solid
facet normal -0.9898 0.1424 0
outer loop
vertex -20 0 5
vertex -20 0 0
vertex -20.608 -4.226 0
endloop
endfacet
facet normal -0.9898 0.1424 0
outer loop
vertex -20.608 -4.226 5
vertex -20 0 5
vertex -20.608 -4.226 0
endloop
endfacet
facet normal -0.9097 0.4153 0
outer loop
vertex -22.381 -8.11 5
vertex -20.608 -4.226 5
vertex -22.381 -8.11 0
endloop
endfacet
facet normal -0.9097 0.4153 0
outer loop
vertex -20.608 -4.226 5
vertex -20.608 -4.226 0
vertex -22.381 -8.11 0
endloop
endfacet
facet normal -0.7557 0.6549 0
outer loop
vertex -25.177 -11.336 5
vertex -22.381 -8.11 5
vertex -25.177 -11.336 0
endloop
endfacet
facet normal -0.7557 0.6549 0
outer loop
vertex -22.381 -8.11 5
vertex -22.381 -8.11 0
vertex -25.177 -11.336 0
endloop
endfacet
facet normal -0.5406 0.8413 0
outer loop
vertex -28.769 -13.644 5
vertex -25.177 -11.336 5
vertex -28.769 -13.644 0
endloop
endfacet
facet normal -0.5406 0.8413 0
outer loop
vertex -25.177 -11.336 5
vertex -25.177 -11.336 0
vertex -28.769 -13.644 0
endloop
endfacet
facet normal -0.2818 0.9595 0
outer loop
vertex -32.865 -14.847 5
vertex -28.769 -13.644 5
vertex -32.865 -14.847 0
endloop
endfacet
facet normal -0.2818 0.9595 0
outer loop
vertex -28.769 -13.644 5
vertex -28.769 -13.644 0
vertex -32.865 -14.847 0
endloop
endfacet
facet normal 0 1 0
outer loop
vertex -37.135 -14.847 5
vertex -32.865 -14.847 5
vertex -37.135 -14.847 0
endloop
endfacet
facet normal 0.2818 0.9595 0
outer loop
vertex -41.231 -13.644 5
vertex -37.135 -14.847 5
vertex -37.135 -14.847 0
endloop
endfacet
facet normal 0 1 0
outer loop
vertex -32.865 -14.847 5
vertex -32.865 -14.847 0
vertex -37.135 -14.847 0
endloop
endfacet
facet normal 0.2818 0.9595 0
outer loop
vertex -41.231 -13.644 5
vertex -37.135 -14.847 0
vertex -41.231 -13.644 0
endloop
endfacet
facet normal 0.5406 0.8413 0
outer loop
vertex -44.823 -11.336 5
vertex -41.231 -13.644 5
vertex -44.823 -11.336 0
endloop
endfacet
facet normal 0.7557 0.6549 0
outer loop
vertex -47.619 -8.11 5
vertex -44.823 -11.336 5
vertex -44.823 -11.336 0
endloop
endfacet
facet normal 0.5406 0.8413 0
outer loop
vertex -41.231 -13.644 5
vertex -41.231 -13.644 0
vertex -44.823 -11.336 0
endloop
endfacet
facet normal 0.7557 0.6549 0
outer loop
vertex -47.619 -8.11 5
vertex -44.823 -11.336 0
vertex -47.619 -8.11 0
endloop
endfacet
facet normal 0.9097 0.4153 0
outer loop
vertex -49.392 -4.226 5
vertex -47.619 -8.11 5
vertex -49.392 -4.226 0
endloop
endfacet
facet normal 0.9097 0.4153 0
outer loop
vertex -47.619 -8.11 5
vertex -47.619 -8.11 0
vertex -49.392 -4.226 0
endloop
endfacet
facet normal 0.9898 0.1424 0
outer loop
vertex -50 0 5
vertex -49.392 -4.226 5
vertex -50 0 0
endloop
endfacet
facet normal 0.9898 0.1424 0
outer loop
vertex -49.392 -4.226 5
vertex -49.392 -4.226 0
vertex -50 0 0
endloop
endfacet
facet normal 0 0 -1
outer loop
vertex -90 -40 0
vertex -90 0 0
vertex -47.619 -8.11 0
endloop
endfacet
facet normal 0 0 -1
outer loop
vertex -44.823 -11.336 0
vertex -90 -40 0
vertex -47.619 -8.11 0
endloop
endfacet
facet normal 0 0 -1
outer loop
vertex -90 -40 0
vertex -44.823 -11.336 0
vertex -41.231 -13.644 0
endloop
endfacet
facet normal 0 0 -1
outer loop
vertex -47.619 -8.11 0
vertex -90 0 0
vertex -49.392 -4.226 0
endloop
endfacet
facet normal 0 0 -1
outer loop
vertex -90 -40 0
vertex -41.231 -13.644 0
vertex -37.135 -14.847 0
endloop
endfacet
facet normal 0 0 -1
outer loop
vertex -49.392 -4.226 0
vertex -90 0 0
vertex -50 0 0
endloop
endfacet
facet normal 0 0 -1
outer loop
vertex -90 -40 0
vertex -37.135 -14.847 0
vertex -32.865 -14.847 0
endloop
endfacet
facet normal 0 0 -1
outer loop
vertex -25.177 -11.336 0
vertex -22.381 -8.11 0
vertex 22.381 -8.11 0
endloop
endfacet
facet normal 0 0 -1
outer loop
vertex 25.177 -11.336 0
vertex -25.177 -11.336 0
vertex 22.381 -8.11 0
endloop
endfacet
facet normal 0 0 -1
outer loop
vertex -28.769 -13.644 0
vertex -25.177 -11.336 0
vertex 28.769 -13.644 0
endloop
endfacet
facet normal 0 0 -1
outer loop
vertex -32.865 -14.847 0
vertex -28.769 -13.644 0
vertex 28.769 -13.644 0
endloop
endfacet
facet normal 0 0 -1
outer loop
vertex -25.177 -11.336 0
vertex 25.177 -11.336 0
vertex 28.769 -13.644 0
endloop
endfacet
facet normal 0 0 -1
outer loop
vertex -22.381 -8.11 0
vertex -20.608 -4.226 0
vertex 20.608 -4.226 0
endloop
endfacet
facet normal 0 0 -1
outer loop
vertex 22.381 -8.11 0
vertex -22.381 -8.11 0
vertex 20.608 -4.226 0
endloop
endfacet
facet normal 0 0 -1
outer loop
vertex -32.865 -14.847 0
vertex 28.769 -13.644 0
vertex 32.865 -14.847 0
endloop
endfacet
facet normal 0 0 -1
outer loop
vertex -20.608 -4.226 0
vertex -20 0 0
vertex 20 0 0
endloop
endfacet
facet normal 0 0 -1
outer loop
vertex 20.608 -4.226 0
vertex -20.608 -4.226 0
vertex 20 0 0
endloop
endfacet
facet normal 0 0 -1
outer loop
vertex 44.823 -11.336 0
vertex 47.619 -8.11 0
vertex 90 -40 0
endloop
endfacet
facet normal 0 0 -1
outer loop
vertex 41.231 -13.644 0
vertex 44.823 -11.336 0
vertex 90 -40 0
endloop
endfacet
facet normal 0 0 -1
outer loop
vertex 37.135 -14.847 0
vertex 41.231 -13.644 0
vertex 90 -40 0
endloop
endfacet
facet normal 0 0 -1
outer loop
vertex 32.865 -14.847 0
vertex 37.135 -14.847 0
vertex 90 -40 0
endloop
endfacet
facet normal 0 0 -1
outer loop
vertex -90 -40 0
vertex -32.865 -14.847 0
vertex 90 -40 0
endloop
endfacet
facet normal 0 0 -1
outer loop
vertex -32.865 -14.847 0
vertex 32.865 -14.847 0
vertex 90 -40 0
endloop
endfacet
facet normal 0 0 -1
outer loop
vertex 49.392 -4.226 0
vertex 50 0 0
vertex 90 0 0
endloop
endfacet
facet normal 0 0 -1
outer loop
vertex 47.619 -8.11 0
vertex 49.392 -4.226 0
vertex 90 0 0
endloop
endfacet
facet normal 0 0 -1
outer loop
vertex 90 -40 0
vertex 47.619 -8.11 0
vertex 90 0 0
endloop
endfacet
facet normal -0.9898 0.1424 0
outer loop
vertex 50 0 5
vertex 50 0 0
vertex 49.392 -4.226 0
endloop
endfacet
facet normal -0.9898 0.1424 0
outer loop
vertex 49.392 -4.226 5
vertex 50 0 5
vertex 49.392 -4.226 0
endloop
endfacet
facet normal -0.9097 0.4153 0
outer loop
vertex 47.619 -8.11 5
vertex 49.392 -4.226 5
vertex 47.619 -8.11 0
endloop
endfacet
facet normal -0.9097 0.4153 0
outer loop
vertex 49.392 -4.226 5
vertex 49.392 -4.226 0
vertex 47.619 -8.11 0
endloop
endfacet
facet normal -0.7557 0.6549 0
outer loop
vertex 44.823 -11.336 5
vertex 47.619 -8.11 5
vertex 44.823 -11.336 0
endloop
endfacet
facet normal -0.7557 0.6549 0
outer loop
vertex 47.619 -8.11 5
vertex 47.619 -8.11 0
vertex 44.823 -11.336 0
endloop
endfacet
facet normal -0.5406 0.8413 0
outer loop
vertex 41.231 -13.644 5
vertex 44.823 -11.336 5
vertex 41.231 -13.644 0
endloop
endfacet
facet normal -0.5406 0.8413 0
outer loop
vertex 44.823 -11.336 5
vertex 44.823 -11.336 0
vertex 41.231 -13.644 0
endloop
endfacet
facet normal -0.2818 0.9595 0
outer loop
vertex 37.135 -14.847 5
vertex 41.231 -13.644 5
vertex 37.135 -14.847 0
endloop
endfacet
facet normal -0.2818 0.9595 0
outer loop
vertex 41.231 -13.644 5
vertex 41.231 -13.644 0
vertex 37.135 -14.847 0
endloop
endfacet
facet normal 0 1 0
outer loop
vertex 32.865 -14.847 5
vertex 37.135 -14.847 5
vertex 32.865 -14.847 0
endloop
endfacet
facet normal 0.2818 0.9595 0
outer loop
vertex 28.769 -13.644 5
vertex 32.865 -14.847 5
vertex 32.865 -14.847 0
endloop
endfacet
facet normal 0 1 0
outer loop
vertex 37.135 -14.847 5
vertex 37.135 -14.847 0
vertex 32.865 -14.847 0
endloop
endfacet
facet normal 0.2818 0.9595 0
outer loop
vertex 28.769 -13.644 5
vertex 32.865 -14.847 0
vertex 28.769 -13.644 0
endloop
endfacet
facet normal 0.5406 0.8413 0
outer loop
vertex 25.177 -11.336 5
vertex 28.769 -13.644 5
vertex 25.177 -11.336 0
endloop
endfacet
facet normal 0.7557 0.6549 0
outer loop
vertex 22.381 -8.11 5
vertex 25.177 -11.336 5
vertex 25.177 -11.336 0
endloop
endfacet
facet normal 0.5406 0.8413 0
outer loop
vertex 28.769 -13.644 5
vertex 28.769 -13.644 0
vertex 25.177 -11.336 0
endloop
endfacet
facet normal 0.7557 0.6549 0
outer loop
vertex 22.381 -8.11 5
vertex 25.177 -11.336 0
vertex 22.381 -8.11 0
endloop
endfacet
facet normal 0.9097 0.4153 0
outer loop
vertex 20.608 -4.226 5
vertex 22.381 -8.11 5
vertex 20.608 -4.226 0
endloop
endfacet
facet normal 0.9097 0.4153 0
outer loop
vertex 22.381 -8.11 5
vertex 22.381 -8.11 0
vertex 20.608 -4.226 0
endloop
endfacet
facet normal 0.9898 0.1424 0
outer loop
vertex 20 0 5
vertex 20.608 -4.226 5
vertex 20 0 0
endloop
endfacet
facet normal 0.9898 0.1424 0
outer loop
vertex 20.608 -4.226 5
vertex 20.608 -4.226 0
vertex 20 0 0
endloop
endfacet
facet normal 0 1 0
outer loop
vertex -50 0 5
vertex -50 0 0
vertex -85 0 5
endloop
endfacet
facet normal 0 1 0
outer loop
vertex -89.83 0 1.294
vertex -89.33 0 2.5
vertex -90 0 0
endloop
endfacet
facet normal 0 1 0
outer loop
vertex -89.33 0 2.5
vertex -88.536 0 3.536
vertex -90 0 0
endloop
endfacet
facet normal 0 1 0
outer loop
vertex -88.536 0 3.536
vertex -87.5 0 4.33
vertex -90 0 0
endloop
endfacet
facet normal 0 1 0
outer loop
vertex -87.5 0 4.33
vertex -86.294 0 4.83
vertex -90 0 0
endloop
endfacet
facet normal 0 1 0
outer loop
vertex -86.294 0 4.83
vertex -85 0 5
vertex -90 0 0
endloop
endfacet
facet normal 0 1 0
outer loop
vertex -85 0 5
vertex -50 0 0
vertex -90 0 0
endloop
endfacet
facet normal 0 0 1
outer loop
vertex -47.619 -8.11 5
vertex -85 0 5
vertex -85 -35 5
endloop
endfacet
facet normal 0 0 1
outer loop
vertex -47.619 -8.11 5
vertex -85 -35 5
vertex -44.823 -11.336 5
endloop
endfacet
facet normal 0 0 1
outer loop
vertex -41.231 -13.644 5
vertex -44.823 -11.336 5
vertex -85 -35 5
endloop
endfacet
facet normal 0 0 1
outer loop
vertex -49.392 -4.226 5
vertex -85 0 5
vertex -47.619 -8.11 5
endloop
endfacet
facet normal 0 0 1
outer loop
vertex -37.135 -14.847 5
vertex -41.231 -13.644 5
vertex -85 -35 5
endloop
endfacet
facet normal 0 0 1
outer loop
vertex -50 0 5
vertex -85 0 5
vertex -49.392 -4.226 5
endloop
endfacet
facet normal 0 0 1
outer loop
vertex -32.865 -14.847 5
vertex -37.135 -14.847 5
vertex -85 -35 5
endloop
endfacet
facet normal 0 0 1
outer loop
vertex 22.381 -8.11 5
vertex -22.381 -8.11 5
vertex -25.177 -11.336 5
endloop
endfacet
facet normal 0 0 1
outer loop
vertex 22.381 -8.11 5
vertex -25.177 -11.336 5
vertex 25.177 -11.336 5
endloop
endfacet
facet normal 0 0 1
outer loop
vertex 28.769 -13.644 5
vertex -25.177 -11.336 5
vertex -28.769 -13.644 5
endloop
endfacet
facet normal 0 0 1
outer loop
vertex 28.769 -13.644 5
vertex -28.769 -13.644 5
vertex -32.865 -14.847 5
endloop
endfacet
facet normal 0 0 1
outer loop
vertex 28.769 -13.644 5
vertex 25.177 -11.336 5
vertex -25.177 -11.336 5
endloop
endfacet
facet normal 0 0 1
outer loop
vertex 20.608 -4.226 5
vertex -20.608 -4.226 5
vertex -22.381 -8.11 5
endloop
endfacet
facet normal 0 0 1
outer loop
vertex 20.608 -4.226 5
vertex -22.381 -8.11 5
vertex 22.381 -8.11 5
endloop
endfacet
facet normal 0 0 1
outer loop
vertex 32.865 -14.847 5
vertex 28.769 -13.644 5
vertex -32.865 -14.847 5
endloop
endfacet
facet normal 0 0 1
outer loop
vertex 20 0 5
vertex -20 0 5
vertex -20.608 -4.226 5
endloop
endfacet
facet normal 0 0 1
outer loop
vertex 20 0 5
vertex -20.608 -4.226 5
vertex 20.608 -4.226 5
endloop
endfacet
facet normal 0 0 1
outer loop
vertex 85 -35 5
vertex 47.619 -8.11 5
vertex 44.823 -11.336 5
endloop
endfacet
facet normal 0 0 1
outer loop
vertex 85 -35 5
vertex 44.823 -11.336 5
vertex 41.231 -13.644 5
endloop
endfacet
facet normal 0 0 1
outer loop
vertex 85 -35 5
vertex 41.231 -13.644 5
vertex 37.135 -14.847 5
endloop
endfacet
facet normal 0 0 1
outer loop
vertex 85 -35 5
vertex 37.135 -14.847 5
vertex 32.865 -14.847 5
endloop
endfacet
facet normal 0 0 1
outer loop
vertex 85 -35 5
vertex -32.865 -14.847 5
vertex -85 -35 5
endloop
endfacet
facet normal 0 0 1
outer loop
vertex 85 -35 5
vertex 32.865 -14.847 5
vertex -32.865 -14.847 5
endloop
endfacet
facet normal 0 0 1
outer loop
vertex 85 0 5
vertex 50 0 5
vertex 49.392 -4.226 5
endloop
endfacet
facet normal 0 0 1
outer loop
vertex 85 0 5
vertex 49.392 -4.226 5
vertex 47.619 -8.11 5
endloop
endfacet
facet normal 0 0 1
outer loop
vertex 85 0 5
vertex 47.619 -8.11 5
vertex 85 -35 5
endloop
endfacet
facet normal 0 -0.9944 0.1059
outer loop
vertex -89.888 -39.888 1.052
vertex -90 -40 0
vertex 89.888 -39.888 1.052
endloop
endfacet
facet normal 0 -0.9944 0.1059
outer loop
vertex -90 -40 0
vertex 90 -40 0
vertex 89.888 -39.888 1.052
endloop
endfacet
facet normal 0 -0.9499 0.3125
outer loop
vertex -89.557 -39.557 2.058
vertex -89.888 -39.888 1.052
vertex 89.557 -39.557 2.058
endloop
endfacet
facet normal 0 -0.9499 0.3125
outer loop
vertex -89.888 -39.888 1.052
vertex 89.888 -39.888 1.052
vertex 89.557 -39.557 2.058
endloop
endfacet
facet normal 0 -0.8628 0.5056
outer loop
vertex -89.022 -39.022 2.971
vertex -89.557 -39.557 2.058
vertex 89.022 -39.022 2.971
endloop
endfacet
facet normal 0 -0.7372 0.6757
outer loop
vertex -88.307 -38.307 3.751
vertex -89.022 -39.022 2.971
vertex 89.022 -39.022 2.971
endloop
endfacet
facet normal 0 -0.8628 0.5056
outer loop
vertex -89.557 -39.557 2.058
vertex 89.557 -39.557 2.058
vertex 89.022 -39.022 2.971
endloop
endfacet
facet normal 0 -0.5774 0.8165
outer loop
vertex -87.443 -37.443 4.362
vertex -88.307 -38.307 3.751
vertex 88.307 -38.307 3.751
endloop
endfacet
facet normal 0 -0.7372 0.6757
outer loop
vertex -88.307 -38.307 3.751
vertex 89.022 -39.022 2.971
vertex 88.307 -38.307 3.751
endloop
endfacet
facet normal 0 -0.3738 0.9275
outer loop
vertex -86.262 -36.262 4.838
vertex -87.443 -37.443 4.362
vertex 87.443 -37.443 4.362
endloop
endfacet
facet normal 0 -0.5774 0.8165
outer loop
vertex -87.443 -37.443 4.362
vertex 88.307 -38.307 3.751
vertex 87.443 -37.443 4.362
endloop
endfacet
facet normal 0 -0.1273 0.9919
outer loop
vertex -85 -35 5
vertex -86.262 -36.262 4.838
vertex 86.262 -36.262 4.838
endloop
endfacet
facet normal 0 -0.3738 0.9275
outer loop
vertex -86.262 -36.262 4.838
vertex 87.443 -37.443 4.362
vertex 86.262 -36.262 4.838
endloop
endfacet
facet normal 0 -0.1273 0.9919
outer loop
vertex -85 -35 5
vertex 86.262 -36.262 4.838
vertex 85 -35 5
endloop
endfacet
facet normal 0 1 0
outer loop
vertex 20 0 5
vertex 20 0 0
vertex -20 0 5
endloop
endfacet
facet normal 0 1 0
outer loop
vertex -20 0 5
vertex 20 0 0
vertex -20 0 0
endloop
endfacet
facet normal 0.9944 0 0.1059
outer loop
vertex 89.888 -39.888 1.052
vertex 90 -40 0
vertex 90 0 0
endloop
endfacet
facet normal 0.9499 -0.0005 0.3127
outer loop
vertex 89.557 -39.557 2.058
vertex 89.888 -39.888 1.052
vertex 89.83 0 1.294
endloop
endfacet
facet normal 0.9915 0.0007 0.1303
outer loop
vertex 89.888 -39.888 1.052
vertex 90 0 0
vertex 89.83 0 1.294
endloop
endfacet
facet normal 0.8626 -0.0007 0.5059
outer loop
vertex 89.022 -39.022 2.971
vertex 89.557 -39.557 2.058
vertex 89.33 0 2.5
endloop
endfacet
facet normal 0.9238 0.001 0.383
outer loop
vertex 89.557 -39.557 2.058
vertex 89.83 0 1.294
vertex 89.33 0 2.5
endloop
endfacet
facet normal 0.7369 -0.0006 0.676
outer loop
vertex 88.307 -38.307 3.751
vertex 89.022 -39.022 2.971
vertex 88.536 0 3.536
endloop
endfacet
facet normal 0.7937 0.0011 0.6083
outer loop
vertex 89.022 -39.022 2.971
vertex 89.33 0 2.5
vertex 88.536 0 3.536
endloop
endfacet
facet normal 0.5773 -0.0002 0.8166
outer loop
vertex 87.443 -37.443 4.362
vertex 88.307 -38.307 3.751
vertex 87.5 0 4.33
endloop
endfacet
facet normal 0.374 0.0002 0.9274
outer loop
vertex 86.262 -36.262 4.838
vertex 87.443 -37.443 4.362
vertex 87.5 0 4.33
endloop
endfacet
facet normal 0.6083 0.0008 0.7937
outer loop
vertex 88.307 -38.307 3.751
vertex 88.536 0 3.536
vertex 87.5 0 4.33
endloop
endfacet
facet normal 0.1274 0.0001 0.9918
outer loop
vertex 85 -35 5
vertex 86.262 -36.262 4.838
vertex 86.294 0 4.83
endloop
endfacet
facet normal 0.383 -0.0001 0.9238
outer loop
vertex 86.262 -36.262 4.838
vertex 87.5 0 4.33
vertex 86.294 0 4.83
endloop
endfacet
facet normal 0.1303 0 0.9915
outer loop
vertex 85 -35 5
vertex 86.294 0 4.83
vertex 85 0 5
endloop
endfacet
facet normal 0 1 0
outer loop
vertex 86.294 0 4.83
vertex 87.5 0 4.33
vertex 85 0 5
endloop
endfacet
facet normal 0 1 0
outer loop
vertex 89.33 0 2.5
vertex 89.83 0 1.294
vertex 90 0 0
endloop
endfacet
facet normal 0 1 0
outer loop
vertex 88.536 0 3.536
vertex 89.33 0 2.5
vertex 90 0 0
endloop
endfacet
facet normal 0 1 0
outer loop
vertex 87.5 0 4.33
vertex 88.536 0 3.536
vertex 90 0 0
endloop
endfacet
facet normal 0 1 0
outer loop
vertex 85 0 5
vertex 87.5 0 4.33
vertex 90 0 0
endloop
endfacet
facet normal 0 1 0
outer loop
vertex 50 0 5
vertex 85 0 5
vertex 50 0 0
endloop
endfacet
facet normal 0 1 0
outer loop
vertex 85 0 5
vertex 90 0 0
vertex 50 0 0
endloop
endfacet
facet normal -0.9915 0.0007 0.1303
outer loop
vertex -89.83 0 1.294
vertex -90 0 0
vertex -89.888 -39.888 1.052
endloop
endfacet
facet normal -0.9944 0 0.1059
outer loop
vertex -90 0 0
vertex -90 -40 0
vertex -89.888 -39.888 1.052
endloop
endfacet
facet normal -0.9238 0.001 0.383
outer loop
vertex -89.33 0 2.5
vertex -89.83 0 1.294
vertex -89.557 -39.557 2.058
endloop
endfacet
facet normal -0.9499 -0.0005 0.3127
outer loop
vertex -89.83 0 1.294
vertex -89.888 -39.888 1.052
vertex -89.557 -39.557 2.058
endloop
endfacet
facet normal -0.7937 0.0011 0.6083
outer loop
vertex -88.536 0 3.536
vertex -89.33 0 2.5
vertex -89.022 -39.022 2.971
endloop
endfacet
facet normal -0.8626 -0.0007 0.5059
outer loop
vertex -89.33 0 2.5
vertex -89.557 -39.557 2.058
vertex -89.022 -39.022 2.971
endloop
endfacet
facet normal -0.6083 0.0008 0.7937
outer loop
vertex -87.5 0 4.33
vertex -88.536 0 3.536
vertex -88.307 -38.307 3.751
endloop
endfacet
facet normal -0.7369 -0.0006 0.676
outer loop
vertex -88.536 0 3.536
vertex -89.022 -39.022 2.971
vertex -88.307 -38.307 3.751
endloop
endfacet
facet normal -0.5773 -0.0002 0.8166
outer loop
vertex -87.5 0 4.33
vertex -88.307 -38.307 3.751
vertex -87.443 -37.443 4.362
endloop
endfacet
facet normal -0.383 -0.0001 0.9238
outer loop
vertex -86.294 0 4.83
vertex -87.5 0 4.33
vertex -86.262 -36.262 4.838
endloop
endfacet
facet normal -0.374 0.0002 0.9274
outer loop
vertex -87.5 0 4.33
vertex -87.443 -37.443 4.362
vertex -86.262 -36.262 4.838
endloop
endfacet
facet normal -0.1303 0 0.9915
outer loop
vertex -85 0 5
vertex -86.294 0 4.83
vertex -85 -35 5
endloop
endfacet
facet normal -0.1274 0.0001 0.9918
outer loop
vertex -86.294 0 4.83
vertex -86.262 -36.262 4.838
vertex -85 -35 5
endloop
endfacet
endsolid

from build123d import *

# Parameters (mm, degrees)
F1_DEPTH = 5
F2_R     = 4.99999


# Not quite as in the source:
# - a fillet or chamfer is up to 0.001 mm smaller than in the source, because OpenCascade refuses the exact size


with BuildPart() as f1:
    # F0 (on Top) → F1 (new body)
    with BuildSketch(Plane.XY):
        with BuildLine():
            Line((20, 0), (0, 0))
            Line((0, 0), (-20, 0))
            ThreePointArc((-20, 0), (-35, -15), (-50, 0))
            Line((-50, 0), (-90, 0))
            Line((-90, 0), (-90, -40))
            Line((-90, -40), (0, -40))
            Line((0, -40), (90, -40))
            Line((90, -40), (90, 0))
            Line((90, 0), (50, 0))
            ThreePointArc((50, 0), (35, -15), (20, 0))
        make_face()
    extrude(amount=F1_DEPTH)

    # F2 (radius 5 in the source; OpenCascade refuses exactly that, so slightly less here)
    f2_edges = [f1.edges().sort_by_distance(p)[0] for p in [
        (0, -40, 5),
        (-90, -20, 5),
        (90, -20, 5),
    ]]
    fillet(f2_edges, radius=F2_R)


solid = f1.part
